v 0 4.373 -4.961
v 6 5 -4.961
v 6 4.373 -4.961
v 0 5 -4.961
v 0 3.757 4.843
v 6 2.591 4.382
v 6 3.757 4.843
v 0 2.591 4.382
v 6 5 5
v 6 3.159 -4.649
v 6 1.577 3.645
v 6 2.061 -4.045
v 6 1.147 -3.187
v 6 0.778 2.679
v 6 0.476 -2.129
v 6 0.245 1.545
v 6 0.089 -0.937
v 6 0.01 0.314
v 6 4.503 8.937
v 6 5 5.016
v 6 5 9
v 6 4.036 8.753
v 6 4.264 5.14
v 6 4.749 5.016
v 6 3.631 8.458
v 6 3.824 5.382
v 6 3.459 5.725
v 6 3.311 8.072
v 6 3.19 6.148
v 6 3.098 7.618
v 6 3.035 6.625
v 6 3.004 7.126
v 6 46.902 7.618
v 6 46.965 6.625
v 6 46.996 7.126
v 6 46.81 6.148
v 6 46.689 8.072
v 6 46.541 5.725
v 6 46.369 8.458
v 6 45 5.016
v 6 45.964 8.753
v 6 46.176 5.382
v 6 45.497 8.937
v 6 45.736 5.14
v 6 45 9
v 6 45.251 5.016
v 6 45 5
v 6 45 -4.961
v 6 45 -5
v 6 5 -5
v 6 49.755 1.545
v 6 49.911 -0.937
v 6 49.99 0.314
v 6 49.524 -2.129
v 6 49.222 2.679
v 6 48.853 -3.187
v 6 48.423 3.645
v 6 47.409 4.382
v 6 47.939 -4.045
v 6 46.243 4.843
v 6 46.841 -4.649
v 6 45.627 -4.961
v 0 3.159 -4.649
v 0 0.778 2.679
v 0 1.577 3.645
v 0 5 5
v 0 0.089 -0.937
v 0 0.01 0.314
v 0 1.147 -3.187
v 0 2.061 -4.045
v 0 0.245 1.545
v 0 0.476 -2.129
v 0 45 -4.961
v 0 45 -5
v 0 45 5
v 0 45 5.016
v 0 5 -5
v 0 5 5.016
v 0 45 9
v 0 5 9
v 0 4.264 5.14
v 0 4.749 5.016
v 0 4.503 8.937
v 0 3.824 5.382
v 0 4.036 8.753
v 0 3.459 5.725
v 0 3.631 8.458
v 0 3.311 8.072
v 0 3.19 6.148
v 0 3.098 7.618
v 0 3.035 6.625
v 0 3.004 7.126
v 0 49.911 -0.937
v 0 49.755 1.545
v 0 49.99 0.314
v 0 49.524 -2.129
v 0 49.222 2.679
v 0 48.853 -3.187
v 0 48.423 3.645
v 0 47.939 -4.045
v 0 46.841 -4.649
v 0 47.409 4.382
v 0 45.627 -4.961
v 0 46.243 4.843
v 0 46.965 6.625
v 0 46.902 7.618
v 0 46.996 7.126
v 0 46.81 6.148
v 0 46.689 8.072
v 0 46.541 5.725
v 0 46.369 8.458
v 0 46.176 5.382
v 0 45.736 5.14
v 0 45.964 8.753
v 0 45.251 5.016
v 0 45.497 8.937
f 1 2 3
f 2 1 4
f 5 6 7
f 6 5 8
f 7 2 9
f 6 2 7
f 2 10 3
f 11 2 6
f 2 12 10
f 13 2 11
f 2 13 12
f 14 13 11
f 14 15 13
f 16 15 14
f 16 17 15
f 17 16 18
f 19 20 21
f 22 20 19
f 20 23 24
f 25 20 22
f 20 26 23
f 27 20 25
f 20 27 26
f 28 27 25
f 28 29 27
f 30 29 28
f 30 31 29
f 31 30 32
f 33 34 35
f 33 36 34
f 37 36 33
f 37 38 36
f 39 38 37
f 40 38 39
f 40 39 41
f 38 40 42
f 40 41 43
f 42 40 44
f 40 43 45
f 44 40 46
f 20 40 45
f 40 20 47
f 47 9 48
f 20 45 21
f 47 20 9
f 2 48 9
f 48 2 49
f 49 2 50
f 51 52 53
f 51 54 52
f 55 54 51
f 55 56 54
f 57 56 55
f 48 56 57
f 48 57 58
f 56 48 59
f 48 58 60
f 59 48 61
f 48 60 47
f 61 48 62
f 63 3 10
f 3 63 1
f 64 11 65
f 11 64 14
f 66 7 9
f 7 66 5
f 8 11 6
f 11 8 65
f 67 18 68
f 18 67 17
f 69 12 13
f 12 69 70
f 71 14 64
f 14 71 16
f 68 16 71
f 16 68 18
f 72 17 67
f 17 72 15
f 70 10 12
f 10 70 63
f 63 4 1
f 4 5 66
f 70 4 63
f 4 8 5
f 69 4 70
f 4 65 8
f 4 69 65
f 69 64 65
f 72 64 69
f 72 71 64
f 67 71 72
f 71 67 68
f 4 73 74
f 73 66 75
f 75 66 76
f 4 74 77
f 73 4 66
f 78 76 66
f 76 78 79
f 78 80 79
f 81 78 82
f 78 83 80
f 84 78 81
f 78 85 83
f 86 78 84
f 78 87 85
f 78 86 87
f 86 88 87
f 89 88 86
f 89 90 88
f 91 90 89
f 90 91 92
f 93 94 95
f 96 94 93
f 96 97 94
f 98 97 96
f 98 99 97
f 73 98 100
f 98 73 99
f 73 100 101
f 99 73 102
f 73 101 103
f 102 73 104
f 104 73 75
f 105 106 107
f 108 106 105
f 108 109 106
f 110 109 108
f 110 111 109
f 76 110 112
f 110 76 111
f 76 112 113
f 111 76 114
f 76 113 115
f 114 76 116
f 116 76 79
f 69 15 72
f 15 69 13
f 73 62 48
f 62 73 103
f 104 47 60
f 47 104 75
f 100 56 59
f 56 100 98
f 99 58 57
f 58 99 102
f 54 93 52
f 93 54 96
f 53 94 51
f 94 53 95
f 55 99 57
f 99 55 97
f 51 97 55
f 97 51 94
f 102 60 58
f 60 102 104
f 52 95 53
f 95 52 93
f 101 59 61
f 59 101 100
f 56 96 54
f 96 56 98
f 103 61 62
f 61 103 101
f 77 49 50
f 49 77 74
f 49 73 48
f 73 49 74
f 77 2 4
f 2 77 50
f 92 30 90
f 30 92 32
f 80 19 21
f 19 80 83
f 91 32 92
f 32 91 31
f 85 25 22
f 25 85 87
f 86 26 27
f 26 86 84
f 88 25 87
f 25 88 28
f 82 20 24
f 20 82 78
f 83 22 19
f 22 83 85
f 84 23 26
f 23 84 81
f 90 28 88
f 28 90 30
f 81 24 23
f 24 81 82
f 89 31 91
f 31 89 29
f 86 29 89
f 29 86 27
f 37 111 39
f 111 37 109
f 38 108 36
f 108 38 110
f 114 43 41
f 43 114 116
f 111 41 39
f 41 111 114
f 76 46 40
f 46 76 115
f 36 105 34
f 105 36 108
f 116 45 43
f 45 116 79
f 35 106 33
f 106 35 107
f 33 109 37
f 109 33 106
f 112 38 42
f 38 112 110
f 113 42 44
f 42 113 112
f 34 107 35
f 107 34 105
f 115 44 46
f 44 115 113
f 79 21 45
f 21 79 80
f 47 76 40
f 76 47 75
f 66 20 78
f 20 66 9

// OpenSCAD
module rectangle_Arrondi(L = 40, l = 6, H = 6, def=25){
    translate([l,H/2,0]) rotate([0,-90,0]) cylinder(d=H,h=l,$fn=def);
    translate([l,L+H/2,0]) rotate([0,-90,0]) cylinder(d=H,h=l,$fn=def);
    translate([0,H/2,-H/2]) cube([l,L, H]);
}

rectangle_Arrondi(40,6,10);
color("red") translate([0,10/2-4/2,10/2+4/2]) rectangle_Arrondi(40,6,4);
